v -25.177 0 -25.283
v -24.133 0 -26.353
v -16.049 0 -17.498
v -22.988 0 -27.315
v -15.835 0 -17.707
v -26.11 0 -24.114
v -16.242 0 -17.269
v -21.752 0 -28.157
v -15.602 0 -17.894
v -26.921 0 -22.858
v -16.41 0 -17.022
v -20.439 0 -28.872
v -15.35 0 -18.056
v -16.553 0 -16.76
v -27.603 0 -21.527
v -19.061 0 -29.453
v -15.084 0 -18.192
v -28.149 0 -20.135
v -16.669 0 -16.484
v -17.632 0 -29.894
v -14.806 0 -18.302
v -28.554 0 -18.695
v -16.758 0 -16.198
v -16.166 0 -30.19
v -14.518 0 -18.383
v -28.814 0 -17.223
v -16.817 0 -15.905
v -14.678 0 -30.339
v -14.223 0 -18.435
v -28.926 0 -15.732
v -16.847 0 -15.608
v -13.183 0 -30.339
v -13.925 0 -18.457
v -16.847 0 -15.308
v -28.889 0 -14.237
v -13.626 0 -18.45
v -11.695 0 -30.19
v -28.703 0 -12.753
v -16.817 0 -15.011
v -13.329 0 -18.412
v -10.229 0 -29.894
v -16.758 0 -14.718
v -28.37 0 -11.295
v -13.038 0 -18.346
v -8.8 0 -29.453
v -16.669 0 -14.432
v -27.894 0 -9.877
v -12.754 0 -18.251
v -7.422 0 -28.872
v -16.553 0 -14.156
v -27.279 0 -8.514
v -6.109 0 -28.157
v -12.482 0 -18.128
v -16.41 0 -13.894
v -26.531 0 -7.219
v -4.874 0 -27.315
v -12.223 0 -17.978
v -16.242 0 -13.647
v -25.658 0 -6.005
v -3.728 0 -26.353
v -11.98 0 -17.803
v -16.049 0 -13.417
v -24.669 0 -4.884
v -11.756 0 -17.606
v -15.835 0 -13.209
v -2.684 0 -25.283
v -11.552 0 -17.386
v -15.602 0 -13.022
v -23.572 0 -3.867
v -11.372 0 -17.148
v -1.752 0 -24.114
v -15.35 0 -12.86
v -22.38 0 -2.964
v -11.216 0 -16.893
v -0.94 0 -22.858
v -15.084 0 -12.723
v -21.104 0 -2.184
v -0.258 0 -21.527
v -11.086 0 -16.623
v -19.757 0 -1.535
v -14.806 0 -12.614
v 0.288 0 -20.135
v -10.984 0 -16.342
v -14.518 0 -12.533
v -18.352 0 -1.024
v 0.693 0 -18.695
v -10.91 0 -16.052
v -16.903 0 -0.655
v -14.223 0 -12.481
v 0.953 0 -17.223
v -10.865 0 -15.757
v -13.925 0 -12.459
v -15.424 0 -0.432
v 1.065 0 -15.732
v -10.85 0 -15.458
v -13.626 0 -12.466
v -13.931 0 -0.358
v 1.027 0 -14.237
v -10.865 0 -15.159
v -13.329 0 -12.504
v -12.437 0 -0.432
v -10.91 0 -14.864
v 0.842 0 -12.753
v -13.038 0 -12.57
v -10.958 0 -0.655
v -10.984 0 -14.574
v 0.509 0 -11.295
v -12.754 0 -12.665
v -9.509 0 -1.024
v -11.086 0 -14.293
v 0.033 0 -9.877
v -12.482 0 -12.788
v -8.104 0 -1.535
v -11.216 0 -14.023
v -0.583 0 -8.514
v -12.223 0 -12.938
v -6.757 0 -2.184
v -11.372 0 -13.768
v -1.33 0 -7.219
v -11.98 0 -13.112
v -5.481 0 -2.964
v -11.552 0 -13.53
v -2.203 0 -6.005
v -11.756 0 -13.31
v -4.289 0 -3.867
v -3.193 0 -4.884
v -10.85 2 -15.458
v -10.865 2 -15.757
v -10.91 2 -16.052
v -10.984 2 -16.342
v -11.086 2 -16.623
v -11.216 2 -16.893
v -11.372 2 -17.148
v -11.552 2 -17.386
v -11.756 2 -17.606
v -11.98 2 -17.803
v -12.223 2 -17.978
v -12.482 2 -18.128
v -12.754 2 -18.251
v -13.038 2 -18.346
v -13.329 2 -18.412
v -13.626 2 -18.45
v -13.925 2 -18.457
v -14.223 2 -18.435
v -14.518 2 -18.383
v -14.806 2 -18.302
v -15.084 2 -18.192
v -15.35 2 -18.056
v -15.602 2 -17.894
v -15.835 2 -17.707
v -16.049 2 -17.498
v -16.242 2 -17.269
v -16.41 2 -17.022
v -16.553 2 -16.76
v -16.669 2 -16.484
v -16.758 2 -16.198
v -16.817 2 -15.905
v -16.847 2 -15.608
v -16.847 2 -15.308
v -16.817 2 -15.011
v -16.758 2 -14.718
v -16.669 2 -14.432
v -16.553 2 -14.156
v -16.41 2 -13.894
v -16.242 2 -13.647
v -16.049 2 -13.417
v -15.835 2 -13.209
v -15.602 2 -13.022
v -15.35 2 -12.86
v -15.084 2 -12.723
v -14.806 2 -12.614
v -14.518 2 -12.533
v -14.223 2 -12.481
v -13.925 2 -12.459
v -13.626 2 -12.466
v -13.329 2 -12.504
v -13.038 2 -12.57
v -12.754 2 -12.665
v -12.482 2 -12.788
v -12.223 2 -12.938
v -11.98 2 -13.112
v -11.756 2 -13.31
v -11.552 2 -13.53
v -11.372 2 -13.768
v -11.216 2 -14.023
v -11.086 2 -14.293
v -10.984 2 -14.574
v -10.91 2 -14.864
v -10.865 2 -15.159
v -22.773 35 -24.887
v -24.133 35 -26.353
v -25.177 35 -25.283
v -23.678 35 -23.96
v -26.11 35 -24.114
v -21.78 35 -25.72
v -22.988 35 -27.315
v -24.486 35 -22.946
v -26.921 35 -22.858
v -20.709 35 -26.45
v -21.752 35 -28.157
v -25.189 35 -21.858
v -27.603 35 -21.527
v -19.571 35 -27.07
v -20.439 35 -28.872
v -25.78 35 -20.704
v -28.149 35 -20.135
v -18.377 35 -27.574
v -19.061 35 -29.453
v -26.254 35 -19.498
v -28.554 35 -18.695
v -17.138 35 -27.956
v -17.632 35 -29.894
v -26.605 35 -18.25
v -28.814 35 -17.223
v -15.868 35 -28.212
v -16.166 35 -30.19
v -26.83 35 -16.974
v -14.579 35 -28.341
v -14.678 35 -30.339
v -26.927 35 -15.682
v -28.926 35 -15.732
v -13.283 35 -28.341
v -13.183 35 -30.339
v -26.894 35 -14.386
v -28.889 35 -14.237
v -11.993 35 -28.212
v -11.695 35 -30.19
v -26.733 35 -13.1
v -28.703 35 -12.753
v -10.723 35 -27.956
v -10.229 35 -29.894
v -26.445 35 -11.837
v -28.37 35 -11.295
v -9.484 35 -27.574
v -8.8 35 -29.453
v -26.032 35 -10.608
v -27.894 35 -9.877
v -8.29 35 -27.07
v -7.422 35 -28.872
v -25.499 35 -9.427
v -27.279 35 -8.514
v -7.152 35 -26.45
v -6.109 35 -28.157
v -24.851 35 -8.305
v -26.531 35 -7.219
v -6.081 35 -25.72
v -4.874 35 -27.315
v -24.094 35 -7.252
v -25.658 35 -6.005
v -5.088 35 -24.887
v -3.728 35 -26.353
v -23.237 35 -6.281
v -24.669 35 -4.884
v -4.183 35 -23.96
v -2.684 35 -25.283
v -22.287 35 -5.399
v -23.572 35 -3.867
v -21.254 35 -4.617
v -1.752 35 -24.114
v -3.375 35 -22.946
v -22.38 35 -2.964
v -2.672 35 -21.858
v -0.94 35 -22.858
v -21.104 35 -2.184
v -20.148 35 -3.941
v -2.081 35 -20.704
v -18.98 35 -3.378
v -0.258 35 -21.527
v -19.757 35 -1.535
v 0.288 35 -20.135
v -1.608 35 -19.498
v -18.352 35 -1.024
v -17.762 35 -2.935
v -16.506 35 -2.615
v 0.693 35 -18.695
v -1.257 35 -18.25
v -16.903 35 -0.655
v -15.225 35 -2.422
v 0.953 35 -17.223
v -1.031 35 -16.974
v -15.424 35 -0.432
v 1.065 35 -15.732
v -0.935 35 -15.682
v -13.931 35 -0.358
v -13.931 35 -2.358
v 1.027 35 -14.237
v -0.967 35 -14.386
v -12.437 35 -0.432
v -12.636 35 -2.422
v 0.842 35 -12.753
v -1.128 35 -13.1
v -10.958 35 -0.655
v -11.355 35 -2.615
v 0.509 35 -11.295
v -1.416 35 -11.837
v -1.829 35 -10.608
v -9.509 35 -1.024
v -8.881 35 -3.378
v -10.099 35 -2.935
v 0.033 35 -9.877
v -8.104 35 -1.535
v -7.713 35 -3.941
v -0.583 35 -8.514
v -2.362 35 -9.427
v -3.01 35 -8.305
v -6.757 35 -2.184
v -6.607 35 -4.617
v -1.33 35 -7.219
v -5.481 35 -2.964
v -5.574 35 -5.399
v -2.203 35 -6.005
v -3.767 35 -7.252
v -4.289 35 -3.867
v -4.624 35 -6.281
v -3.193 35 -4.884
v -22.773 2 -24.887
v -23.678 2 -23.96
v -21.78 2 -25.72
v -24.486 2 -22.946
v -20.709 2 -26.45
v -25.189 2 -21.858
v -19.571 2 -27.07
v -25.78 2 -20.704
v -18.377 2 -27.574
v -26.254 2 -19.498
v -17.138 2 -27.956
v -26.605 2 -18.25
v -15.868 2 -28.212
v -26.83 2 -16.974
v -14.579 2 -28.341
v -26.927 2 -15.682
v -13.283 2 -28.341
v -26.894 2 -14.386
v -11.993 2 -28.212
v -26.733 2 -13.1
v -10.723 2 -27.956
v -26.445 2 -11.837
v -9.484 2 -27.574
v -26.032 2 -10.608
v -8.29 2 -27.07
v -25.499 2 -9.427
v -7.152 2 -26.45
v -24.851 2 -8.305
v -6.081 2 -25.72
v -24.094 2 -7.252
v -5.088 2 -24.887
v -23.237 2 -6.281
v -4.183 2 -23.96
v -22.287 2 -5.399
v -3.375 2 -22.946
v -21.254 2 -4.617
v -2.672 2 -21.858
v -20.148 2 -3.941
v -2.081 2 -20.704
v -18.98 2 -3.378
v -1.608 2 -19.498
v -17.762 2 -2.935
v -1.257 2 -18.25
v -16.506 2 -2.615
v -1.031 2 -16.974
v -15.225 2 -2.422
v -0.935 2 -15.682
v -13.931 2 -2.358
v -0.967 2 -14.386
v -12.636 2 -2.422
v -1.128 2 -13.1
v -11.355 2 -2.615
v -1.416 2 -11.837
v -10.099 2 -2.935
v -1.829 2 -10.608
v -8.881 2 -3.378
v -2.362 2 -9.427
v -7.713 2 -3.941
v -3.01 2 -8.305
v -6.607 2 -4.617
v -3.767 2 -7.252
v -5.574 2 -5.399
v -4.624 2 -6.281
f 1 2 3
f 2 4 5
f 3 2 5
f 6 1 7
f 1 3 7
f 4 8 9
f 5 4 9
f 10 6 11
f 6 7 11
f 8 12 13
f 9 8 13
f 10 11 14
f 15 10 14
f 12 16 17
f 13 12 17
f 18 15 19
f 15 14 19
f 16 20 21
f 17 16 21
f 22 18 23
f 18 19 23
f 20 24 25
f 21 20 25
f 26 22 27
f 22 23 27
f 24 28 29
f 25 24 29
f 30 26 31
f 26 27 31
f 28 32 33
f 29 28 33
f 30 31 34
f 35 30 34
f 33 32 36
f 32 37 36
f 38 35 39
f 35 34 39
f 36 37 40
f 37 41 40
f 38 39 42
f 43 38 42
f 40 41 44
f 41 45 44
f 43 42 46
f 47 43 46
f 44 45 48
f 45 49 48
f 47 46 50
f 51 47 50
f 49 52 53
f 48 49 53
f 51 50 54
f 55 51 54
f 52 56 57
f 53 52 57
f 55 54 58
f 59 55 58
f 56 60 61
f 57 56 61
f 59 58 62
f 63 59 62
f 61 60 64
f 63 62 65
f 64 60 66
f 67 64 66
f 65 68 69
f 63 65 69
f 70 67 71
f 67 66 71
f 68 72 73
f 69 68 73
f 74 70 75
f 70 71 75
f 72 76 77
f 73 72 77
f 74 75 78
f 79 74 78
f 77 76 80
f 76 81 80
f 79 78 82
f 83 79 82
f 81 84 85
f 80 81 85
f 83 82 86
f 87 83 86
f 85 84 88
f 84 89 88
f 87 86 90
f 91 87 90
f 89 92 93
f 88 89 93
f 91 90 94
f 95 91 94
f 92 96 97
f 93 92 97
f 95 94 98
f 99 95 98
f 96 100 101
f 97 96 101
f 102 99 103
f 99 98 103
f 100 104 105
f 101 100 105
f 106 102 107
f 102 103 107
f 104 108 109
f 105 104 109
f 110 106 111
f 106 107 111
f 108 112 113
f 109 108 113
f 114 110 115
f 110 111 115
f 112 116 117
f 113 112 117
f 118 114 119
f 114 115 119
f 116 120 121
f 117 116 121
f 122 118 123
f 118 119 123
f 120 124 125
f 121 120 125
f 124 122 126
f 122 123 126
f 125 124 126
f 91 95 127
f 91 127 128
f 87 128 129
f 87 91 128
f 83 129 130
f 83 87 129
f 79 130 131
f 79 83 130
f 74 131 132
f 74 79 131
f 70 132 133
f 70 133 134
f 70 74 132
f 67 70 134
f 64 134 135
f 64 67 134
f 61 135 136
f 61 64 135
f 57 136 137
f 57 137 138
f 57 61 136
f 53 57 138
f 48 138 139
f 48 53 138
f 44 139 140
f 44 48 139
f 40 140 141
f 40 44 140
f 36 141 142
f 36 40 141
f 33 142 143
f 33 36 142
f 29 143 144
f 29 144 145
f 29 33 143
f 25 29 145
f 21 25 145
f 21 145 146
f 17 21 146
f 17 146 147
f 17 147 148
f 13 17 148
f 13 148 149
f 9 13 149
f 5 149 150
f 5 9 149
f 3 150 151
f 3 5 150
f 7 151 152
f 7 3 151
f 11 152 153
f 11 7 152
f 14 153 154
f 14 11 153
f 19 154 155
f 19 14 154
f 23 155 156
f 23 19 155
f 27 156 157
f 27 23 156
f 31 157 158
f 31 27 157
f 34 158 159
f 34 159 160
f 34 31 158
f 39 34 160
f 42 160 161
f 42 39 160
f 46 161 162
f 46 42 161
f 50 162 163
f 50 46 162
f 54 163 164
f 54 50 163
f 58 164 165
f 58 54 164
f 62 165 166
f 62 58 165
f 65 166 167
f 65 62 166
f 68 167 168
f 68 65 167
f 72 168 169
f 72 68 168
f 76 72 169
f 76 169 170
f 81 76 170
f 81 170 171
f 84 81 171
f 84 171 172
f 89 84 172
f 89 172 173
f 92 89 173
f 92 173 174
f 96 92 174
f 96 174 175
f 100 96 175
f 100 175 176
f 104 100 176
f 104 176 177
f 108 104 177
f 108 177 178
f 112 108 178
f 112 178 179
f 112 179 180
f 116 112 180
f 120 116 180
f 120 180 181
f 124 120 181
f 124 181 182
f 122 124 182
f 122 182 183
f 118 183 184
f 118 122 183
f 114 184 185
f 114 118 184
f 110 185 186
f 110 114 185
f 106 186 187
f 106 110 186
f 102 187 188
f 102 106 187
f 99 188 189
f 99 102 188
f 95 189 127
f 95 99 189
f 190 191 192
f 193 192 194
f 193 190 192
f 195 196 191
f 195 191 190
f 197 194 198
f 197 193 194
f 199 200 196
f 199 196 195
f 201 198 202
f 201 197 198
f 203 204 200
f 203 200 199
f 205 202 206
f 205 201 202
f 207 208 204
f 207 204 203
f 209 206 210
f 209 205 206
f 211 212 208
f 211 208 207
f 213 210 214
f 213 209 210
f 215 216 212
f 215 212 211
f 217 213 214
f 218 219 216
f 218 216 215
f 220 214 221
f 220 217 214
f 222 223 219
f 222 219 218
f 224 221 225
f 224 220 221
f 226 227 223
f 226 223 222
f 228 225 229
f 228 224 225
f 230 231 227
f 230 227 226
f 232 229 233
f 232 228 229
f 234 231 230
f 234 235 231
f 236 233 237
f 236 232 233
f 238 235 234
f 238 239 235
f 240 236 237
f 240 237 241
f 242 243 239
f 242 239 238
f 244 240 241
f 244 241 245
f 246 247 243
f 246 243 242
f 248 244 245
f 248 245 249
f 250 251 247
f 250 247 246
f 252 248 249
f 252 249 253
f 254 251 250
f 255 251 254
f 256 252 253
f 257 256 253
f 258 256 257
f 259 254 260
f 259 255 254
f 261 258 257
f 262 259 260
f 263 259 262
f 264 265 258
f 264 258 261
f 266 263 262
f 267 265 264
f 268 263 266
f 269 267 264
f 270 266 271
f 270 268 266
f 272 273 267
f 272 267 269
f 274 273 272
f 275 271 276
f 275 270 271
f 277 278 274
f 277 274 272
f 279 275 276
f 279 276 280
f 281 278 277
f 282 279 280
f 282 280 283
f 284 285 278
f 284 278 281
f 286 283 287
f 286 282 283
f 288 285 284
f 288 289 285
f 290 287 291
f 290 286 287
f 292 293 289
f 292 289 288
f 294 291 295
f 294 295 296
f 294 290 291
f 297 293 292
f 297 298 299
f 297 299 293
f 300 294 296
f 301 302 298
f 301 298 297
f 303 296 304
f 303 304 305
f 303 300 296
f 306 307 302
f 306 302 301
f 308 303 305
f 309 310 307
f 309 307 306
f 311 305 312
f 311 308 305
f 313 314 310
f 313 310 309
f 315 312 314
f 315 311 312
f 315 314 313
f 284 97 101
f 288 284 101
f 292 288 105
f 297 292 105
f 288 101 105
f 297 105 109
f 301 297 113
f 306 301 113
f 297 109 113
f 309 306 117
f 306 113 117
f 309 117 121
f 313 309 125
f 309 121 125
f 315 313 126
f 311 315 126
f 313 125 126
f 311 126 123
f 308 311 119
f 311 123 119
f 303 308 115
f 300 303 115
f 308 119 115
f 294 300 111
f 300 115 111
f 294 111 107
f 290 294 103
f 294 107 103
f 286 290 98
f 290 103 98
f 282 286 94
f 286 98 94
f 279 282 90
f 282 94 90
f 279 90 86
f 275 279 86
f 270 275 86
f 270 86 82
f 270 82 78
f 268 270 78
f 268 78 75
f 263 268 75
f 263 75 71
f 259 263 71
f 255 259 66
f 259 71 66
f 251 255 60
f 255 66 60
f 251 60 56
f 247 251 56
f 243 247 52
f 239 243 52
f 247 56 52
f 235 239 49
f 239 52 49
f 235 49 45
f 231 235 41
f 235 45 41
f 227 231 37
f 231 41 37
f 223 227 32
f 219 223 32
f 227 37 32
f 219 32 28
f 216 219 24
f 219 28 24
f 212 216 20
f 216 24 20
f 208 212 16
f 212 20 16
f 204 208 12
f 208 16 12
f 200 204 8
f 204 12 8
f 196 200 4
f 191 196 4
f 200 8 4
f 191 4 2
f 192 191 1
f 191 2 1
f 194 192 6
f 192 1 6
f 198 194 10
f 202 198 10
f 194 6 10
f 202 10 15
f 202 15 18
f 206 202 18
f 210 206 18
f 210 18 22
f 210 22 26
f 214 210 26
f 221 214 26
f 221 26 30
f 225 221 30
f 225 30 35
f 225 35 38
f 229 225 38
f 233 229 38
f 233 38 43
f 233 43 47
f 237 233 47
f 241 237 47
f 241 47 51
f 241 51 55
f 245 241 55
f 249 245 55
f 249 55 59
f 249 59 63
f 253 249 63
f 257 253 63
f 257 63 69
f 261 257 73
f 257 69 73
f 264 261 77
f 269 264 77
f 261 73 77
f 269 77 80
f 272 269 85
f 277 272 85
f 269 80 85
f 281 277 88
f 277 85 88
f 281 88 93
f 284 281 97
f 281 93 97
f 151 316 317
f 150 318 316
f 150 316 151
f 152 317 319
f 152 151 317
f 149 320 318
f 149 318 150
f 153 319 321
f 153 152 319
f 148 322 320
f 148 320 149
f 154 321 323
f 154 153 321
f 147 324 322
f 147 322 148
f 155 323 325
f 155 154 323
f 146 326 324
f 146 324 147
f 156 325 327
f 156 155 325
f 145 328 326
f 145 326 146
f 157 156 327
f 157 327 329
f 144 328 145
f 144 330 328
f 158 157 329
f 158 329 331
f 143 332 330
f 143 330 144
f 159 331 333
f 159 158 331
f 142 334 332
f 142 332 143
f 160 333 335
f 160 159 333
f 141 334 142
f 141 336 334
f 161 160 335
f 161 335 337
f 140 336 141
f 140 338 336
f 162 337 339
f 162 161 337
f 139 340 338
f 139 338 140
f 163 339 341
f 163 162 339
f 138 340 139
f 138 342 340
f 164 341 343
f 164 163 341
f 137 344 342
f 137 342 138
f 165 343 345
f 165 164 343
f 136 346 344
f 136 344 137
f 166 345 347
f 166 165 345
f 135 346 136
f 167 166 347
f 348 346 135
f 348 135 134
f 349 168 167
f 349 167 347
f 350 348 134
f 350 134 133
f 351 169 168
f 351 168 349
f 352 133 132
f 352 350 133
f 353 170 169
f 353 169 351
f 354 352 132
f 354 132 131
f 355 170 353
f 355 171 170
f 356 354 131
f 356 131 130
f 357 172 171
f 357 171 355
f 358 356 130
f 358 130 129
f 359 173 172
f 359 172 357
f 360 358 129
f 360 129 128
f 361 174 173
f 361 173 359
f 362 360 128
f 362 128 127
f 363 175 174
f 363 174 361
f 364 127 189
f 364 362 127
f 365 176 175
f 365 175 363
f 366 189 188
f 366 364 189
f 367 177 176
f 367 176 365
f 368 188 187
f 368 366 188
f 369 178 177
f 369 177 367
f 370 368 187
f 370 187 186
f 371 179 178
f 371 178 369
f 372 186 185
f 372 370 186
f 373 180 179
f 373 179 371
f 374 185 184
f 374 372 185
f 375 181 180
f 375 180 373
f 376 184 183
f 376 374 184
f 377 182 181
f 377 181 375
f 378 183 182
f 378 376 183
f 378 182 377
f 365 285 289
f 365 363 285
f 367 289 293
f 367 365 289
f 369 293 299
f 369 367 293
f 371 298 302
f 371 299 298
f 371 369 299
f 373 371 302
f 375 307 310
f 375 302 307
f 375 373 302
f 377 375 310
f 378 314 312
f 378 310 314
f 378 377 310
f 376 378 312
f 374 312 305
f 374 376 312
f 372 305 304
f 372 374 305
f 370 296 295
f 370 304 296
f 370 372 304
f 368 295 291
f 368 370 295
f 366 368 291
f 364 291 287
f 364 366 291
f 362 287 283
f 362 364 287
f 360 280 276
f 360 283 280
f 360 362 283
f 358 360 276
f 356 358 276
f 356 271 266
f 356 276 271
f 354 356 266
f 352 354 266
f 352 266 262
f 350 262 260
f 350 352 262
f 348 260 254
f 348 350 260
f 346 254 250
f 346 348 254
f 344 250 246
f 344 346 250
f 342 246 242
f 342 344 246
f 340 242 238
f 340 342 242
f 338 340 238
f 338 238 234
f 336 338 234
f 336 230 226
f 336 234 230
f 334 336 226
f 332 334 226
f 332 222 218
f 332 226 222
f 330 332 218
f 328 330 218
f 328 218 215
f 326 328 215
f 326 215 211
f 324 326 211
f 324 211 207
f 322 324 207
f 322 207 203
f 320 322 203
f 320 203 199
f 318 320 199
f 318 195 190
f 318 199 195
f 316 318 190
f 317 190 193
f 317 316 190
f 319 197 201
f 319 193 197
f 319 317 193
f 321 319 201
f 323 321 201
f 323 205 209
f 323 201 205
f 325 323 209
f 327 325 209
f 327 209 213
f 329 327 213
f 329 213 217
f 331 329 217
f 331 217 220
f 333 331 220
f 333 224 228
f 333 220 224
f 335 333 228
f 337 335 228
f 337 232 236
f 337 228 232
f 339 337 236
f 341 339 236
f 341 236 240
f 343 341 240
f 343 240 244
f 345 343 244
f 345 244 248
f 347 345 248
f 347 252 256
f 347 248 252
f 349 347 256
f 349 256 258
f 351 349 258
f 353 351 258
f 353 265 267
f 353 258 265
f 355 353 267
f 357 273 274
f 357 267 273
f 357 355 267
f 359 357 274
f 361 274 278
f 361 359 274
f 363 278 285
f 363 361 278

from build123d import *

# Parameters (mm, degrees)
SKETCH1_R               = 15
BOSS_EXTRUDE1_DEPTH     = 35
SHELL1_T                = -2
ADVANCEDHOLE1_OUTLINE_R = 3
ADVANCEDHOLE1_DEPTH     = 2


# Read off the part's stored shape, not the designer's step: AdvancedHole1
with BuildPart() as part:
    # Sketch1 → Boss-Extrude1 (new body)
    with BuildSketch(Plane(origin=(0, 0, 0), x_dir=(1, 0, 0), z_dir=(0, 1, 0))):
        with Locations(Location((-13.930579922, 15.357614938, 0), (0, 0, 270))):
            Circle(SKETCH1_R)
    extrude(amount=BOSS_EXTRUDE1_DEPTH)

    # Shell1
    shell1_openings = [part.faces().sort_by_distance(p)[0] for p in [
        (-13.930579922, 35, -15.357614938),
    ]]
    offset(amount=SHELL1_T, openings=shell1_openings, kind=Kind.INTERSECTION)

    # AdvancedHole1 outline → AdvancedHole1 (cut)
    with BuildSketch(Plane(origin=(0, 0, 0), x_dir=(1, 0, 0), z_dir=(0, 1, 0))):
        with Locations((-13.850292644, 15.457974035)):
            Circle(ADVANCEDHOLE1_OUTLINE_R)
    extrude(amount=ADVANCEDHOLE1_DEPTH, mode=Mode.SUBTRACT)


solid = part.part
